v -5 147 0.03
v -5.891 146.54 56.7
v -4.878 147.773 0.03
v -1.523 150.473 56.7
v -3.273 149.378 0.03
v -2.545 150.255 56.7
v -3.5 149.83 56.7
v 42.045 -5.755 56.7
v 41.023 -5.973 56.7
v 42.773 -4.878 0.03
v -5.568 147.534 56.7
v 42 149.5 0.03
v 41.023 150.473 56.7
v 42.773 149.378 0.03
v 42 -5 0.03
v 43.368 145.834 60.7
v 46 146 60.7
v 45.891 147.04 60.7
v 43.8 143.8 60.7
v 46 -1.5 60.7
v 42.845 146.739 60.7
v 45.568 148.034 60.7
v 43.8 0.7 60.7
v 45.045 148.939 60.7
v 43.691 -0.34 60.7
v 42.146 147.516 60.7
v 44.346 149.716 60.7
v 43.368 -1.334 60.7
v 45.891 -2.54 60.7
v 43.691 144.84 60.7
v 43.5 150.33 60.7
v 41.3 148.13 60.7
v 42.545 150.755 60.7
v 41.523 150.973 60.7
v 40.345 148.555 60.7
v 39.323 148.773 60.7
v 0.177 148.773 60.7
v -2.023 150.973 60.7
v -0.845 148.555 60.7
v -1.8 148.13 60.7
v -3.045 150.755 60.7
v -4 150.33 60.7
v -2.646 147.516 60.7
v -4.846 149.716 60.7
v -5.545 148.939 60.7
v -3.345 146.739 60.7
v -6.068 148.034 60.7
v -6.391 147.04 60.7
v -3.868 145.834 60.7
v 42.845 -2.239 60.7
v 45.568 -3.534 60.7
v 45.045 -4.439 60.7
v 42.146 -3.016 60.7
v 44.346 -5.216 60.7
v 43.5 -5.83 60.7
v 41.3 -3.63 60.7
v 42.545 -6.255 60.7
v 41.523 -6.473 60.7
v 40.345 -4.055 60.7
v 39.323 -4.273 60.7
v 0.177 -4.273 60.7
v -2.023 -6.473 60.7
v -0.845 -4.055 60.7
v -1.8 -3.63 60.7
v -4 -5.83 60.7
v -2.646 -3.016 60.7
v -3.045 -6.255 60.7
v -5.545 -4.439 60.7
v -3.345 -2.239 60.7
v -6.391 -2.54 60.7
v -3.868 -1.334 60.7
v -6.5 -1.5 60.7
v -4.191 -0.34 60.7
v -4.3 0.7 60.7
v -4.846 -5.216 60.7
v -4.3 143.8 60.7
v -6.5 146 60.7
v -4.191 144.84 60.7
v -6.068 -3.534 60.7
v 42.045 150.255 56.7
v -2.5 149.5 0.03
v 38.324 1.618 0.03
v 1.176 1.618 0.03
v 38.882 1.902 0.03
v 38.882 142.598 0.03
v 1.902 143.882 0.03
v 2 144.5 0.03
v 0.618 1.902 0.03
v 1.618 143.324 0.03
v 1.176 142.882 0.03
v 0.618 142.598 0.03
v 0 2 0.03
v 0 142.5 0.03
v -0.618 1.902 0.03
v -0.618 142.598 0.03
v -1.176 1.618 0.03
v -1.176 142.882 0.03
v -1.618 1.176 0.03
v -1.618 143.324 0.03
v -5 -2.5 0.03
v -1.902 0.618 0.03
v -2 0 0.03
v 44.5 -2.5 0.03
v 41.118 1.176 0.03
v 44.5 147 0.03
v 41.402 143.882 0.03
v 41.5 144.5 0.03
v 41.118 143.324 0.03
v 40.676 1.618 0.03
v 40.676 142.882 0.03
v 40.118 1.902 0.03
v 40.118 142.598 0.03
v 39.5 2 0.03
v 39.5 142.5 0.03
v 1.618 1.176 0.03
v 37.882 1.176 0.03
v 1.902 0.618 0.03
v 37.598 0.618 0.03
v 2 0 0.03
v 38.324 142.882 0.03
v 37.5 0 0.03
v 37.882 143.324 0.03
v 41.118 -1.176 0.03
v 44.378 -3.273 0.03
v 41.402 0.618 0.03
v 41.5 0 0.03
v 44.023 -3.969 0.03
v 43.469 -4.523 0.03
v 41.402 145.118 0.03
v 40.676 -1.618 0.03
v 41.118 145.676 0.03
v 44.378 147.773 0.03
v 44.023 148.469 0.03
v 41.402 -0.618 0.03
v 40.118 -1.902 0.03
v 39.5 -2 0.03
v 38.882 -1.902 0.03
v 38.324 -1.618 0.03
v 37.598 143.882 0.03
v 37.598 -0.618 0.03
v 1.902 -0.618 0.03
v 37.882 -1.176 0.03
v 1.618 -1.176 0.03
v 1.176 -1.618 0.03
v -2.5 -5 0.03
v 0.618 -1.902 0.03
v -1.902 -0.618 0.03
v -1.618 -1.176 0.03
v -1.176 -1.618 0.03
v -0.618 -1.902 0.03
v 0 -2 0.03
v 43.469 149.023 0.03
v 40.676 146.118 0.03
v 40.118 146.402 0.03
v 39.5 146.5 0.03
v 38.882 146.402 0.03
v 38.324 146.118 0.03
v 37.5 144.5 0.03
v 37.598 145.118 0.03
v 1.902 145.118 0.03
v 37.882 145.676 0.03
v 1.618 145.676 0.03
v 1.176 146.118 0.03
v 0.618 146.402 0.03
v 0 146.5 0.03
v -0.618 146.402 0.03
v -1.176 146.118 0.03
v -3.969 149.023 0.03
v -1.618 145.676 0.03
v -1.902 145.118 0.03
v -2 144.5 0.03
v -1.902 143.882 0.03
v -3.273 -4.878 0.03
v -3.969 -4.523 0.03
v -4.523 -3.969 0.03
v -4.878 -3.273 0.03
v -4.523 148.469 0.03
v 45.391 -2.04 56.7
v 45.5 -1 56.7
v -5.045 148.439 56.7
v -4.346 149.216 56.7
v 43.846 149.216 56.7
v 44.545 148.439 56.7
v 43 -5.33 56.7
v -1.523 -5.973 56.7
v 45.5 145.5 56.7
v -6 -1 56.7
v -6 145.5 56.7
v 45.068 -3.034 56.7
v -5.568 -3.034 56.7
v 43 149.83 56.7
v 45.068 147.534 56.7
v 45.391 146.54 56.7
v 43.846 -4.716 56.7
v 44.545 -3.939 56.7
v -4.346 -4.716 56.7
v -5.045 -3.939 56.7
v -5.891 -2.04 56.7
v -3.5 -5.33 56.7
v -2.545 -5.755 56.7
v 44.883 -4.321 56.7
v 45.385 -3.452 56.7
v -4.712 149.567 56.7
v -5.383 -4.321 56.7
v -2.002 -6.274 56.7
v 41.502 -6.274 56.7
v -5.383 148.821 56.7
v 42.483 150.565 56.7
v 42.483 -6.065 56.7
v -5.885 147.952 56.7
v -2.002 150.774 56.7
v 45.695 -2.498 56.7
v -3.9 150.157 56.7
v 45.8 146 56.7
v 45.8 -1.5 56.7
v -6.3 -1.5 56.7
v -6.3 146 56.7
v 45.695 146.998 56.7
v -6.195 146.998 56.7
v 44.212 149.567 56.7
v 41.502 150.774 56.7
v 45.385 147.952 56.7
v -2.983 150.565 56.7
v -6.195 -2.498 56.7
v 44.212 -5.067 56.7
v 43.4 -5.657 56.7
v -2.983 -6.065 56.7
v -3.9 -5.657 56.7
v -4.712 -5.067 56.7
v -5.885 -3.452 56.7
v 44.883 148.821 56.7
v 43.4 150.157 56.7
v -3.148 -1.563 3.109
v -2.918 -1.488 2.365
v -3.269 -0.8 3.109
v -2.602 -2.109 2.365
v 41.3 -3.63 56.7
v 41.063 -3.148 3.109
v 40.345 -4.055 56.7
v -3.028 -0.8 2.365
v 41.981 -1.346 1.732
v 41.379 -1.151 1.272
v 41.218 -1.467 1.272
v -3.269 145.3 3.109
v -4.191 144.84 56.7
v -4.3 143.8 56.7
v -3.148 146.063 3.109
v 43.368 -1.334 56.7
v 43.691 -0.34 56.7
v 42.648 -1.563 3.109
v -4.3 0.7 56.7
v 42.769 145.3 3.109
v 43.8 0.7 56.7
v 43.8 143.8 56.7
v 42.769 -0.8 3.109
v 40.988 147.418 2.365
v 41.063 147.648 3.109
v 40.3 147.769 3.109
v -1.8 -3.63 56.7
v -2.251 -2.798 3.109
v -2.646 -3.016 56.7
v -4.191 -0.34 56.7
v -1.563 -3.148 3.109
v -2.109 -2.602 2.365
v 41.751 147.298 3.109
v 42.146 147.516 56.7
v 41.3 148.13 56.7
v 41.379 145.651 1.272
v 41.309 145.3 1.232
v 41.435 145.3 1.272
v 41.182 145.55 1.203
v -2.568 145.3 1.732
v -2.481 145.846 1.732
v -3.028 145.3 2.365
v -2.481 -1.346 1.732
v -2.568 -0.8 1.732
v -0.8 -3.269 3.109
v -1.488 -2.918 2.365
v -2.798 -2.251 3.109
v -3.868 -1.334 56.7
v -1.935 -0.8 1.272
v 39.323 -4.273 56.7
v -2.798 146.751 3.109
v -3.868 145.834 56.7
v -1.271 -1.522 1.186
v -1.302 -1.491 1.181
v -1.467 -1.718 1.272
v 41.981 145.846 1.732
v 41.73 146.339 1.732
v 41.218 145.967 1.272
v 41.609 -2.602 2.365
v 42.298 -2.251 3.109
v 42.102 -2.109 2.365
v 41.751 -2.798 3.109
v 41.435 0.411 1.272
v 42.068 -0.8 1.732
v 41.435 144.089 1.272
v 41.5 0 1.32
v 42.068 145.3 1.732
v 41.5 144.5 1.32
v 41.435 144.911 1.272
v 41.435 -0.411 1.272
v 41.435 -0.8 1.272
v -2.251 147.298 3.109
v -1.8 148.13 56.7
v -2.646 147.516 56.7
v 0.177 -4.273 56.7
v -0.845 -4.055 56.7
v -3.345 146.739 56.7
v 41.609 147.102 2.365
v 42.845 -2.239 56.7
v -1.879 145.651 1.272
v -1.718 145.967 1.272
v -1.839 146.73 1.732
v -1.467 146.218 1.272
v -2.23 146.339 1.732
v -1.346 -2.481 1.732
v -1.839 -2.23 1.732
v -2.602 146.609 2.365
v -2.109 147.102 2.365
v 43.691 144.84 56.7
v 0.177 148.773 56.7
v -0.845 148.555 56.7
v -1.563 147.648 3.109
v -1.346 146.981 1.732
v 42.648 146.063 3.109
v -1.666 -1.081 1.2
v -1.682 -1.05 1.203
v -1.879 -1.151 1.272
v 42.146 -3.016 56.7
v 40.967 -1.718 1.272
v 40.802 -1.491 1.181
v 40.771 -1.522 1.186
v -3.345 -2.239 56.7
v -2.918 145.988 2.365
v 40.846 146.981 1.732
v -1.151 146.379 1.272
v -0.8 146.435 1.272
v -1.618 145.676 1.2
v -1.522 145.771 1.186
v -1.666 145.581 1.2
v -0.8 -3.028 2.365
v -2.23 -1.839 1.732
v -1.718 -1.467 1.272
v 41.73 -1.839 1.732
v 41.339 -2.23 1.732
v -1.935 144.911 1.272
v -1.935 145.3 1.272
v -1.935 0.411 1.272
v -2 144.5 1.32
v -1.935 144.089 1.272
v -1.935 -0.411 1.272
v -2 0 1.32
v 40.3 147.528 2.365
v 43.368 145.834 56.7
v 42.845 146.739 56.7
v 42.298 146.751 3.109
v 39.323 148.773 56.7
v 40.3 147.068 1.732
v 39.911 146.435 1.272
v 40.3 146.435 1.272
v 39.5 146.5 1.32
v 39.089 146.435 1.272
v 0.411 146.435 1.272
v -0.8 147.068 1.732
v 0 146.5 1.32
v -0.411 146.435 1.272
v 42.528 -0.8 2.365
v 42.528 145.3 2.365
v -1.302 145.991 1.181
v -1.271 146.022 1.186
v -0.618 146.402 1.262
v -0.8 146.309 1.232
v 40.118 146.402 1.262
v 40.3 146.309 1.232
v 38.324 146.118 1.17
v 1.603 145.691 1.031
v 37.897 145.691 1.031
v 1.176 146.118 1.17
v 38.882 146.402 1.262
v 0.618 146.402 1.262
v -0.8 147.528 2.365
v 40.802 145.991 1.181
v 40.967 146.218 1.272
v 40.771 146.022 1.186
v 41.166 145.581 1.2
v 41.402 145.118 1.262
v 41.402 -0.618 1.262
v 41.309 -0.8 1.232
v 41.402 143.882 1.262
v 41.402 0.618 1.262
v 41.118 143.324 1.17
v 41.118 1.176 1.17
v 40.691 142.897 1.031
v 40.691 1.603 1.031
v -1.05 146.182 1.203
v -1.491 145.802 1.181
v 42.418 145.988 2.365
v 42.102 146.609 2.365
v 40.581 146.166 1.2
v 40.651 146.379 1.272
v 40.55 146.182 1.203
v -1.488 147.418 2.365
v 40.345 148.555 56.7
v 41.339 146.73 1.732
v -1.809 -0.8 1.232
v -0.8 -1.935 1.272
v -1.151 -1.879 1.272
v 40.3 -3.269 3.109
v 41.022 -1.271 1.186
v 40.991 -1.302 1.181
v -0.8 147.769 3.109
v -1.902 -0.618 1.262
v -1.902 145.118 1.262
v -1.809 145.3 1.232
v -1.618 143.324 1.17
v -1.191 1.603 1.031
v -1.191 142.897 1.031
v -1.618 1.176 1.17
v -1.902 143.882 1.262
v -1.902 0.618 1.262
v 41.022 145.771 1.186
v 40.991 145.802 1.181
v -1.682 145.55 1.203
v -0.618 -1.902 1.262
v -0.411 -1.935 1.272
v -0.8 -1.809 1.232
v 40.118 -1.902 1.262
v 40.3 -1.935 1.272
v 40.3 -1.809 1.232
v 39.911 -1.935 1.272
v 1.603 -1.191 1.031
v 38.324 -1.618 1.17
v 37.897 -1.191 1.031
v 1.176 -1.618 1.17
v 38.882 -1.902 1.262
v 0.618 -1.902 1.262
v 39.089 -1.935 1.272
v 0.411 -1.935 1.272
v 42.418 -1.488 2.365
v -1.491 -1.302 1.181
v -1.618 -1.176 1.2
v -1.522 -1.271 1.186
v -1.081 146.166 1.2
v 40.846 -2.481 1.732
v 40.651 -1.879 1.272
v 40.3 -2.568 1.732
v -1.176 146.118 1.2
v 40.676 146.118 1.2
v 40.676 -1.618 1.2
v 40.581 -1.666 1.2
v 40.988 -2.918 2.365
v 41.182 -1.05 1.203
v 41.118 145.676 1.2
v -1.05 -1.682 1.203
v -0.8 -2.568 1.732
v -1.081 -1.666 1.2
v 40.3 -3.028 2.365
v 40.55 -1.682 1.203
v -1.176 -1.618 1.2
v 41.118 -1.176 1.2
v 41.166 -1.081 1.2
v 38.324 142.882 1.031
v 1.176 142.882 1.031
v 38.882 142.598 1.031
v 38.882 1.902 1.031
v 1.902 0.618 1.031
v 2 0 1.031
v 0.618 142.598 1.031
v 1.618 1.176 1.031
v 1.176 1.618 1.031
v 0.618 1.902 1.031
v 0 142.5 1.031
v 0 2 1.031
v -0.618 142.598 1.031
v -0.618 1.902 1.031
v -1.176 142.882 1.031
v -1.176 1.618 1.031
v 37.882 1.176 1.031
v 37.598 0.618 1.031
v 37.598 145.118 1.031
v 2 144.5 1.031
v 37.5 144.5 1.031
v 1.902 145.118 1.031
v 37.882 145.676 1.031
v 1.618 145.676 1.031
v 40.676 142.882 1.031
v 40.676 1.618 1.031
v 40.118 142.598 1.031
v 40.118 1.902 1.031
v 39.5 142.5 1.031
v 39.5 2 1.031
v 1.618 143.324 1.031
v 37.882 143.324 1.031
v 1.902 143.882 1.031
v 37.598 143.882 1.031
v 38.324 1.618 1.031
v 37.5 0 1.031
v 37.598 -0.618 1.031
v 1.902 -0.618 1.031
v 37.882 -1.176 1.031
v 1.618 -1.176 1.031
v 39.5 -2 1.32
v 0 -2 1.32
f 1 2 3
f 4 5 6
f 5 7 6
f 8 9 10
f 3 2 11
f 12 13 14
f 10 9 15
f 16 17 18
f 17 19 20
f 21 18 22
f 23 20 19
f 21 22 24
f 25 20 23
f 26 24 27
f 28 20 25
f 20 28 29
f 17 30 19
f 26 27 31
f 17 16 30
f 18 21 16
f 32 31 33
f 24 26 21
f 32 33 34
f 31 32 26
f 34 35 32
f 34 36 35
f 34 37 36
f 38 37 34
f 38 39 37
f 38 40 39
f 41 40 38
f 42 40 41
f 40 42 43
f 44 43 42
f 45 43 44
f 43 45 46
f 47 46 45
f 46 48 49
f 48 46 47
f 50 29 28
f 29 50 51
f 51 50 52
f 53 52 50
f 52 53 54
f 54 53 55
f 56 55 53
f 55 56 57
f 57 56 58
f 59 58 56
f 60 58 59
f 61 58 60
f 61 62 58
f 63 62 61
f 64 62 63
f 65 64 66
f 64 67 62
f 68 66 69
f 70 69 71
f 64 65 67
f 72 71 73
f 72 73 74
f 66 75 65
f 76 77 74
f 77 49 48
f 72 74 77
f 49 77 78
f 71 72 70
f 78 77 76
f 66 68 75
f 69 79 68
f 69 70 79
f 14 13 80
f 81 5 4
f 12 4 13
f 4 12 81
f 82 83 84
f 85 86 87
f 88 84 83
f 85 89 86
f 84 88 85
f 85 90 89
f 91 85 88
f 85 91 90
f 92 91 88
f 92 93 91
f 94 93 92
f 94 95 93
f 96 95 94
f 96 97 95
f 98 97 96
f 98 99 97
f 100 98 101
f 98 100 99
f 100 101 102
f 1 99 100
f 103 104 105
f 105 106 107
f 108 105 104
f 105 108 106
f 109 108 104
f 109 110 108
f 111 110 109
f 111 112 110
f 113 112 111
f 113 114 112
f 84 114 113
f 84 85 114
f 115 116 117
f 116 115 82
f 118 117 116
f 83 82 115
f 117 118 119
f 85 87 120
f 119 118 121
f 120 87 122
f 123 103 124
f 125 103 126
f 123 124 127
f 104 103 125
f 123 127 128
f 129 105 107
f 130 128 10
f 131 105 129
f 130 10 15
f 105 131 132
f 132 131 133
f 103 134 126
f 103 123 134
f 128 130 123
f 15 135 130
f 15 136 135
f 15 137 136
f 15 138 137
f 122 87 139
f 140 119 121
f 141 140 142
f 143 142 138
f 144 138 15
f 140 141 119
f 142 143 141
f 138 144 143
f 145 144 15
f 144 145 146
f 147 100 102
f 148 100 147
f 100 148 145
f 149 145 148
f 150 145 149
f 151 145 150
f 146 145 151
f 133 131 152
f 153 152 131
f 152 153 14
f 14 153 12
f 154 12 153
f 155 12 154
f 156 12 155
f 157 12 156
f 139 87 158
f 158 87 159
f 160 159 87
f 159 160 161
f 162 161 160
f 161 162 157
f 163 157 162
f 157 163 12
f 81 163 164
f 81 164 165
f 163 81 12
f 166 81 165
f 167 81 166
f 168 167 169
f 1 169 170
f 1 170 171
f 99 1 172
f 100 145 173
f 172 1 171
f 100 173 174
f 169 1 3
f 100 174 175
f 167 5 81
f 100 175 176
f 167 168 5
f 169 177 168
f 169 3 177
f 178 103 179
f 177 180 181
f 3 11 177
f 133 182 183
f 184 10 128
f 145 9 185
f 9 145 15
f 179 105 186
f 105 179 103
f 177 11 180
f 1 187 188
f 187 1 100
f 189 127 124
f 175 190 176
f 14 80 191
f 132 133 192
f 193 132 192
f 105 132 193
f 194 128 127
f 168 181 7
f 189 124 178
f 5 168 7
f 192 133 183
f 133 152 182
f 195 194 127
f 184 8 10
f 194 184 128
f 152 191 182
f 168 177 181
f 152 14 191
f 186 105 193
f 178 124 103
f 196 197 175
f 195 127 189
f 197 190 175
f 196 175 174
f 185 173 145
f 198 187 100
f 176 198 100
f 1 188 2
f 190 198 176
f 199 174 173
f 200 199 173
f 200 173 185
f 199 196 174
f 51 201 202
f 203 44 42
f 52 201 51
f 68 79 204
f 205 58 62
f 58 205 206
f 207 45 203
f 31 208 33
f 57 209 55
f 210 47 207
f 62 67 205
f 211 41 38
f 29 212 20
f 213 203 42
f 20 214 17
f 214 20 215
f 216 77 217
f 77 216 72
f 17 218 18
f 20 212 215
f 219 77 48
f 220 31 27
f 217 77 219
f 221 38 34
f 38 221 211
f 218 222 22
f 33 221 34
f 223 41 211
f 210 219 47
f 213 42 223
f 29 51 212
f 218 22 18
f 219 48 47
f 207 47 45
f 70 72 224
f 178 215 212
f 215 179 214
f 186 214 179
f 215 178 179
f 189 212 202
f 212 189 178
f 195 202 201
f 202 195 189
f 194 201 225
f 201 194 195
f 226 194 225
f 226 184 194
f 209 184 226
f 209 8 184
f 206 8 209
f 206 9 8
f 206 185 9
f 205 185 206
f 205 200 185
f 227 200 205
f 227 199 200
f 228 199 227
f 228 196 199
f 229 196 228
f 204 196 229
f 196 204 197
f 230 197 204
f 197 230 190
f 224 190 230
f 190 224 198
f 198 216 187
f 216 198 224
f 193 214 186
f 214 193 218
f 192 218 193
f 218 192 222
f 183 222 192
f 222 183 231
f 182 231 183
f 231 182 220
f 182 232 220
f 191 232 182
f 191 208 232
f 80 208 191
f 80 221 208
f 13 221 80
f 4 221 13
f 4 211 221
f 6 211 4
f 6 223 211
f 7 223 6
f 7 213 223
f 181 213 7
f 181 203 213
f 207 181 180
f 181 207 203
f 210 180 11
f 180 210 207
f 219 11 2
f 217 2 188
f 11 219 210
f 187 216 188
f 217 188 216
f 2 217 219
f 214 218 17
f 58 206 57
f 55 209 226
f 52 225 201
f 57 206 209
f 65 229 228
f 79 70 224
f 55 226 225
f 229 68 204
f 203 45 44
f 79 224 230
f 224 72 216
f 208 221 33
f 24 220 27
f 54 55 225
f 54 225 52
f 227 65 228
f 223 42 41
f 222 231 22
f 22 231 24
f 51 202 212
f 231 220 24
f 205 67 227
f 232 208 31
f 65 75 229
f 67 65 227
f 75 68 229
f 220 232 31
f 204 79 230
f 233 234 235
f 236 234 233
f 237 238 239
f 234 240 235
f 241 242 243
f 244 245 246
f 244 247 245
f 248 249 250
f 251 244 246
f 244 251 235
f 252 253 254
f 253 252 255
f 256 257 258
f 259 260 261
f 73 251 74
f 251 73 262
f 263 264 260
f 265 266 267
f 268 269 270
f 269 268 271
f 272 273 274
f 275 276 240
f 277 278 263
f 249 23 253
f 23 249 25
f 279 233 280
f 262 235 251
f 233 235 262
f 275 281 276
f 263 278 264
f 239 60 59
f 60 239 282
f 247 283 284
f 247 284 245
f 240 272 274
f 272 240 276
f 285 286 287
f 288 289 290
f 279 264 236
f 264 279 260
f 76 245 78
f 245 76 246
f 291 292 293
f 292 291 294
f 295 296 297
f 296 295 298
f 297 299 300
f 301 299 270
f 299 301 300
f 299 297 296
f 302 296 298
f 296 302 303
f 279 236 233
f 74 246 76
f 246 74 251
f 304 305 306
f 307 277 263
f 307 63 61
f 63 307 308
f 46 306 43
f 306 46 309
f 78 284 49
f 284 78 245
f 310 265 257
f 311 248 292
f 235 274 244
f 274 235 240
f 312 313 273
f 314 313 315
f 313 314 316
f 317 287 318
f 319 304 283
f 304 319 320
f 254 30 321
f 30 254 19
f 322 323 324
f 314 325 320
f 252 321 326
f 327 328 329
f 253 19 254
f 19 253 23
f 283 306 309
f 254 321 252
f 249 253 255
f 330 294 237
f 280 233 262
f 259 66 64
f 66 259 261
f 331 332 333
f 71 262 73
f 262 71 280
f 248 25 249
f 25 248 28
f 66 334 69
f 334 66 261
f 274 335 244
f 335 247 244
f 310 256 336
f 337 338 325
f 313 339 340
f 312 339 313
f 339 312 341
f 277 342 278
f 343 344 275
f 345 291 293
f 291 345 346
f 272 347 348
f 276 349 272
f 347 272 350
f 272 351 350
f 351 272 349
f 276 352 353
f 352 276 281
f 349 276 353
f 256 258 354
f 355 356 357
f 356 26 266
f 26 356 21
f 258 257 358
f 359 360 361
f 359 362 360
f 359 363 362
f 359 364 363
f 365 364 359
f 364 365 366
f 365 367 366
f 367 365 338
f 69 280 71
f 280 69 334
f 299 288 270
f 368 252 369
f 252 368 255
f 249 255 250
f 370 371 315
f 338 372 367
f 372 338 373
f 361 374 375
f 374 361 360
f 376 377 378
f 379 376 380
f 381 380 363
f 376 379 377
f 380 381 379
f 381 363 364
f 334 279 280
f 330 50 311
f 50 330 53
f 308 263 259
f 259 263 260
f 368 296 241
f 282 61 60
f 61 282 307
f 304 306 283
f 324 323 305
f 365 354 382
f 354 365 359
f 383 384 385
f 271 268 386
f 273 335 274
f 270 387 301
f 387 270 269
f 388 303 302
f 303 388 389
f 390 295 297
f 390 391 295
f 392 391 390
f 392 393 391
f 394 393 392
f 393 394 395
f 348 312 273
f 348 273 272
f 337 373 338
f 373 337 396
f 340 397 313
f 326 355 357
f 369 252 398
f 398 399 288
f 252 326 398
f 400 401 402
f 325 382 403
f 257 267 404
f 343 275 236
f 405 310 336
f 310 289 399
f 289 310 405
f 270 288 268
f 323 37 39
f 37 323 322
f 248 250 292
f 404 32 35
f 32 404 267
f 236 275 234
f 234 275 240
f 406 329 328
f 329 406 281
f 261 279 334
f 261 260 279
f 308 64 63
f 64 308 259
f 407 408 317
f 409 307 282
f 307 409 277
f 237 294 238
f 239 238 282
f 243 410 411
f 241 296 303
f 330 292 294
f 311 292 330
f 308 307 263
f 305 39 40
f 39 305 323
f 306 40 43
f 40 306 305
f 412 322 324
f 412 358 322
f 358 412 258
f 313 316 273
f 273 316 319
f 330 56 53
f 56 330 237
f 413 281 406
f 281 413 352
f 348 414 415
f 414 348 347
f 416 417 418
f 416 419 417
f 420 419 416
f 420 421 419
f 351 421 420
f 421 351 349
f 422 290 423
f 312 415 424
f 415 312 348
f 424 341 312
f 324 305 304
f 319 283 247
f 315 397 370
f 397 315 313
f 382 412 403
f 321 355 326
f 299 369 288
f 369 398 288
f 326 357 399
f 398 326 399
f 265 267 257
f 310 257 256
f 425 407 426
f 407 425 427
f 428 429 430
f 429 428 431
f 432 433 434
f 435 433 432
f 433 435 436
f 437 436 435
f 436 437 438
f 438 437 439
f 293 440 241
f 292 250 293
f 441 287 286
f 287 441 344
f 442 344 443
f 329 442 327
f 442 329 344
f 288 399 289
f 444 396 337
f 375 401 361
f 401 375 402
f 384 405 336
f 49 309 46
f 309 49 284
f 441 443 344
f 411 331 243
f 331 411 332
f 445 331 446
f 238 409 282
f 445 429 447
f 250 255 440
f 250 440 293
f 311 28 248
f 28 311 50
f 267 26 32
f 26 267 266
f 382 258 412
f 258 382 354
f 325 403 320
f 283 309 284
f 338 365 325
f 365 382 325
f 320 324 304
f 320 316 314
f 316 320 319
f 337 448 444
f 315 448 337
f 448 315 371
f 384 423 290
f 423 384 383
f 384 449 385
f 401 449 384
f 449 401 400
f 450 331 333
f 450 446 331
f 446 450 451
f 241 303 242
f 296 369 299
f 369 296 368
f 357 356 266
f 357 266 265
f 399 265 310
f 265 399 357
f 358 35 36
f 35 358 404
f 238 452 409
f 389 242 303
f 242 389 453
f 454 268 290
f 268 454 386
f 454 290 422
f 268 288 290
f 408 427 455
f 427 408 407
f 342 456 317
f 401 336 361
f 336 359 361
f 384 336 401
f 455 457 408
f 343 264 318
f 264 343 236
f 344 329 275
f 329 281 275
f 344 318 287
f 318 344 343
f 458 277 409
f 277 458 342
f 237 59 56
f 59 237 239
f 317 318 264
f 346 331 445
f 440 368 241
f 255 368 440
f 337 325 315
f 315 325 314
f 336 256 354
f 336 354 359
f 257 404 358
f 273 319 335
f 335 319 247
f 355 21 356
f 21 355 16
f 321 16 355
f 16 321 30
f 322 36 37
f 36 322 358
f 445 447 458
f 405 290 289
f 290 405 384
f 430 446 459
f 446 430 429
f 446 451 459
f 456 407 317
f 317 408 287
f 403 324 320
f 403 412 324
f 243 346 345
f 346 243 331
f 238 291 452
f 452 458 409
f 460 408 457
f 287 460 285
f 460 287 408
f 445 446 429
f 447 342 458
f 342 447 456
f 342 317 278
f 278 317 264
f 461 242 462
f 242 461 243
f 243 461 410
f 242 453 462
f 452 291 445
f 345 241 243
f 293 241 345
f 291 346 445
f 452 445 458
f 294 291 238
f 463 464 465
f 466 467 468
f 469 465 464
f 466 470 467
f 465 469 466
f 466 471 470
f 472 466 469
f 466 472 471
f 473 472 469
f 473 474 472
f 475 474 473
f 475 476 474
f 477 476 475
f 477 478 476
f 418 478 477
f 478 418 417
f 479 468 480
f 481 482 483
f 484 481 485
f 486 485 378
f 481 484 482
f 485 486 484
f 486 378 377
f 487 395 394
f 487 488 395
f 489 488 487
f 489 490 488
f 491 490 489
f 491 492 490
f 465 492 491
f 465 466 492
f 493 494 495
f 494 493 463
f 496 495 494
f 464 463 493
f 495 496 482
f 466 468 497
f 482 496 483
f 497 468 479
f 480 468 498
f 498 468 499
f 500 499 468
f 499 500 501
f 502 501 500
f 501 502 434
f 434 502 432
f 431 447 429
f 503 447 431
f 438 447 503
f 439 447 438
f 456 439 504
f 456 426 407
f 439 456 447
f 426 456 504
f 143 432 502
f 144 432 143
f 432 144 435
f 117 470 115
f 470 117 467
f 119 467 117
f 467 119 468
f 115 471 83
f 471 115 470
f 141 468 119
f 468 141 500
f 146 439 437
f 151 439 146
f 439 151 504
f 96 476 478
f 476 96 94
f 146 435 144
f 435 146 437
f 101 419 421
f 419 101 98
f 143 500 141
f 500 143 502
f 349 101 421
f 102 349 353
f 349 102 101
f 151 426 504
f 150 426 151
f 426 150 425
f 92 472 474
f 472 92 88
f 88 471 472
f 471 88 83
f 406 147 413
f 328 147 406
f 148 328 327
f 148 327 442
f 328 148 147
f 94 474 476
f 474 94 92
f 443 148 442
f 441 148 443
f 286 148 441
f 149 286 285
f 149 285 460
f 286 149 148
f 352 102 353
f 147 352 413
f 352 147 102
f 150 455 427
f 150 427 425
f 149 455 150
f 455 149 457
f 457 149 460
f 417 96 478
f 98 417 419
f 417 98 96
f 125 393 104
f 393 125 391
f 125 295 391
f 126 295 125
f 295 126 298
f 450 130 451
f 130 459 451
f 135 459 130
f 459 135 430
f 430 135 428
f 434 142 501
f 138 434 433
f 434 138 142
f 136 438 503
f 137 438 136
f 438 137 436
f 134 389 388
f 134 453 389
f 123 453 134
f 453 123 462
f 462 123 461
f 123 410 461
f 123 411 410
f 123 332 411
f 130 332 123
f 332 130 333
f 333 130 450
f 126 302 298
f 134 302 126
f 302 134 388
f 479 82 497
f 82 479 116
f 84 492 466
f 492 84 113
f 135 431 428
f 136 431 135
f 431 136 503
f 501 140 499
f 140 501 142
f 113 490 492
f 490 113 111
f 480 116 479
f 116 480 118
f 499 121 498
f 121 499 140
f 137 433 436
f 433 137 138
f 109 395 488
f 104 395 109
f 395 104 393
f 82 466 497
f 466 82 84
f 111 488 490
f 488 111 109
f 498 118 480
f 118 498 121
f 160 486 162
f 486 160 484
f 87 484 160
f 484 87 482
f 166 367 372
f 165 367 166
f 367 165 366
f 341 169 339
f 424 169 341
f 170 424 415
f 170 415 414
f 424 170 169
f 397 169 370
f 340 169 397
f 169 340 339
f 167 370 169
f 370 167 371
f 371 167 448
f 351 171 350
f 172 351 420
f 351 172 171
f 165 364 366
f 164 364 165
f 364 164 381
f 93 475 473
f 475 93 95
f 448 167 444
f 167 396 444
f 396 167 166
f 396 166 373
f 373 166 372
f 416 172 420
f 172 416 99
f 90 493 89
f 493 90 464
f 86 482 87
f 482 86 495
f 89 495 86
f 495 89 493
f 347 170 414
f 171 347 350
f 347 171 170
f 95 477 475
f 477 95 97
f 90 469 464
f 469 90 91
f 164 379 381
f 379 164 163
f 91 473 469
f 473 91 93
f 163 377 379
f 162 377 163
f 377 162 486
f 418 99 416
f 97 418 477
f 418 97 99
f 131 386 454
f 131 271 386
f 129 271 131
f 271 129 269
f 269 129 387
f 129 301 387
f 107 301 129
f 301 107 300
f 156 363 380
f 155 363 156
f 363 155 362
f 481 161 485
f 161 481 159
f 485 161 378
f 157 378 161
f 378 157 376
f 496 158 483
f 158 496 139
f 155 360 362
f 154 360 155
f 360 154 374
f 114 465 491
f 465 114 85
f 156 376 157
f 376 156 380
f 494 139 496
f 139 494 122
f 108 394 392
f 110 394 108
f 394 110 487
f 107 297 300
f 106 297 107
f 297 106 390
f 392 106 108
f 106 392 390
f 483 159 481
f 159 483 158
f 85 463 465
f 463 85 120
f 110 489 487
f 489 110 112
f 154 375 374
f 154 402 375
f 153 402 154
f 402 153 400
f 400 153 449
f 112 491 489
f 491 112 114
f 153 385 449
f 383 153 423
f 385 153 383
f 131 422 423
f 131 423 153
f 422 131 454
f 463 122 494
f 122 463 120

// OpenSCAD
// created by pretenda
// http://www.thingiverse.com/pretenda/designs

// If you are reading this, sorry for my spaghetti code.

// Options!
//cube([39.5,92,50]);
/* [T-Boxx Insert] */
// What do you want to render out?
what = "boxx"; // [boxx:Boxx Insert,pegs:Pegs,both:Both Boxx Insert and Pegs]
// How many units wide?
modulesH = 1; // [1:8]
// How many units deep?
modulesV = 3; // [1:6]

/* [Misc Parameters] */
// Wall Thickness. Too thin and it is a bit flimsy, 1.7 seems about right for me.
wallThickness = 1.7;
// Peg Diameter. This width for me is quite snug, might need to dial it down depending on your printer.
pegDiameter = 7.4;

/* [Hidden] */
pegDistance = 39.5; //92 for two -- so 13 difference
baseCornerDiameter = 5;
topCornerDiameter = 10;
topWidth = 52.5;
topLowerWidth = 51.5;
topInnerDiameter = 48.5;
bottomWidth = 49.5;
height = 60.7;



pegSlackH = (modulesH - 1) * 13;
pegSlackV = (modulesV - 1) * 13;

blPosX = 0;
blPosY = 0;

brPosX = modulesH * pegDistance + pegSlackH;
brPosY = 0;

tlPosX = 0;
tlPosY = modulesV * pegDistance + pegSlackV;

trPosX = modulesH * pegDistance + pegSlackH;
trPosY = modulesV * pegDistance + pegSlackV;

// Pegs?!
/*translate([0,0,-2]) {
cylinder(2, pegDiameter / 2, pegDiameter / 2);
translate([brPosX, 0, 0]) cylinder(2, pegDiameter / 2, pegDiameter / 2);
translate([0, tlPosY, 0]) cylinder(2, pegDiameter / 2, pegDiameter / 2);
translate([trPosX, trPosY, 0]) cylinder(2, pegDiameter / 2, pegDiameter / 2);
}*/

module boxx()
{

difference()
{

union()
{
hull()
{

translate([-(bottomWidth - pegDistance) / 2 + baseCornerDiameter / 2, -(bottomWidth - pegDistance) / 2 + baseCornerDiameter / 2, 0.03]) #cylinder(2, baseCornerDiameter/2,baseCornerDiameter/2, $fn = 20);


translate([brPosX, brPosY, 0]) translate([(bottomWidth - pegDistance) / 2 - baseCornerDiameter / 2, -(bottomWidth - pegDistance) / 2 + baseCornerDiameter / 2, 0.03]) #cylinder(2, baseCornerDiameter/2,baseCornerDiameter/2, $fn = 20);

translate([tlPosX, tlPosY, 0]) translate([-(bottomWidth - pegDistance) / 2 + baseCornerDiameter / 2, (bottomWidth - pegDistance) / 2 - baseCornerDiameter / 2, 0.03]) #cylinder(2, baseCornerDiameter/2,baseCornerDiameter/2, $fn = 20);

translate([trPosX, trPosY, 0]) translate([(bottomWidth - pegDistance) / 2 - baseCornerDiameter / 2, (bottomWidth - pegDistance) / 2 - baseCornerDiameter / 2, 0.03]) #cylinder(2, baseCornerDiameter/2,baseCornerDiameter/2, $fn = 20);

// Bottom
translate([blPosX, blPosY, height]) translate([-(topLowerWidth - pegDistance) / 2 + topCornerDiameter / 2, -(topLowerWidth - pegDistance) / 2 + topCornerDiameter / 2, -4]) cylinder(4, topCornerDiameter / 2, topCornerDiameter / 2, $fn = 30);

translate([brPosX, brPosY, height]) translate([(topLowerWidth - pegDistance) / 2 - topCornerDiameter / 2, -(topLowerWidth - pegDistance) / 2 + topCornerDiameter / 2, -4]) cylinder(4, topCornerDiameter / 2, topCornerDiameter / 2, $fn = 30);

translate([tlPosX, tlPosY, height]) translate([-(topLowerWidth - pegDistance) / 2 + topCornerDiameter / 2, (topLowerWidth - pegDistance) / 2 - topCornerDiameter / 2, -4]) cylinder(4, topCornerDiameter / 2, topCornerDiameter / 2, $fn = 30);

translate([trPosX, trPosY, height]) translate([(topLowerWidth - pegDistance) / 2 - topCornerDiameter / 2, (topLowerWidth - pegDistance) / 2 - topCornerDiameter / 2, -4]) cylinder(4, topCornerDiameter / 2, topCornerDiameter / 2, $fn = 30);
}


hull()
{


translate([blPosX, blPosY, height]) translate([-(topWidth - pegDistance) / 2 + topCornerDiameter / 2, -(topWidth - pegDistance) / 2 + topCornerDiameter / 2, -4]) cylinder(4, topCornerDiameter / 2 -0.2, topCornerDiameter / 2, $fn = 30);

translate([brPosX, brPosY, height]) translate([(topWidth - pegDistance) / 2 - topCornerDiameter / 2, -(topWidth - pegDistance) / 2 + topCornerDiameter / 2, -4]) cylinder(4, topCornerDiameter / 2 -0.2, topCornerDiameter / 2, $fn = 30);

translate([tlPosX, tlPosY, height]) translate([-(topWidth - pegDistance) / 2 + topCornerDiameter / 2, (topWidth - pegDistance) / 2 - topCornerDiameter / 2, -4]) cylinder(4, topCornerDiameter / 2 -0.2, topCornerDiameter / 2, $fn = 30);

translate([trPosX, trPosY, height]) translate([(topWidth - pegDistance) / 2 - topCornerDiameter / 2, (topWidth - pegDistance) / 2 - topCornerDiameter / 2, -4]) cylinder(4, topCornerDiameter / 2 -0.2, topCornerDiameter / 2, $fn = 30);

}
}




 // inside carved out
hull()
{
translate([blPosX +wallThickness, blPosY + wallThickness, 1]) translate([-(bottomWidth - pegDistance) / 2 + baseCornerDiameter / 2, -(bottomWidth - pegDistance) / 2 + baseCornerDiameter / 2, baseCornerDiameter / 2]) sphere(baseCornerDiameter/2, $fn = 20);

translate([brPosX - wallThickness, brPosY + wallThickness, 1]) translate([(bottomWidth - pegDistance) / 2 - baseCornerDiameter / 2, -(bottomWidth - pegDistance) / 2 + baseCornerDiameter / 2, baseCornerDiameter / 2]) sphere(baseCornerDiameter/2, $fn = 20);

translate([tlPosX + wallThickness, tlPosY - wallThickness, 1]) translate([-(bottomWidth - pegDistance) / 2 + baseCornerDiameter / 2, (bottomWidth - pegDistance) / 2 - baseCornerDiameter / 2, baseCornerDiameter / 2]) sphere(baseCornerDiameter/2, $fn = 20);

translate([trPosX - wallThickness, trPosY - wallThickness, 1]) translate([(bottomWidth - pegDistance) / 2 - baseCornerDiameter / 2, (bottomWidth - pegDistance) / 2 - baseCornerDiameter / 2, baseCornerDiameter / 2]) sphere(baseCornerDiameter/2, $fn = 20);

// Bottom
translate([blPosX + wallThickness, blPosY + wallThickness, height]) translate([-(topLowerWidth - pegDistance) / 2 + topCornerDiameter / 2, -(topLowerWidth - pegDistance) / 2 + topCornerDiameter / 2, -4]) cylinder(5, topCornerDiameter / 2, topCornerDiameter / 2, $fn = 30);

translate([brPosX - wallThickness, brPosY + wallThickness, height]) translate([(topLowerWidth - pegDistance) / 2 - topCornerDiameter / 2, -(topLowerWidth - pegDistance) / 2 + topCornerDiameter / 2, -4]) cylinder(5, topCornerDiameter / 2, topCornerDiameter / 2, $fn = 30);

translate([tlPosX + wallThickness, tlPosY - wallThickness, height]) translate([-(topLowerWidth - pegDistance) / 2 + topCornerDiameter / 2, (topLowerWidth - pegDistance) / 2 - topCornerDiameter / 2, -4]) cylinder(5, topCornerDiameter / 2, topCornerDiameter / 2, $fn = 30);

translate([trPosX - wallThickness, trPosY- wallThickness, height]) translate([(topLowerWidth - pegDistance) / 2 - topCornerDiameter / 2, (topLowerWidth - pegDistance) / 2 - topCornerDiameter / 2, -4]) cylinder(5, topCornerDiameter / 2, topCornerDiameter / 2, $fn = 30);
}


// Holes for pegs to slot into

cylinder(20, 2, 2, $fn = 20);
translate([brPosX, 0, 0]) cylinder(20, 2, 2, $fn = 20);
translate([0, tlPosY, 0]) cylinder(20, 2, 2, $fn = 20);
translate([trPosX, trPosY, 0]) cylinder(20, 2, 2, $fn = 20);

}
}




module peg() {
union()
{
cylinder(2, pegDiameter/2, pegDiameter/2, $fn = 20);
translate([0,0,1]) cylinder(2, 1.8, 1.8, $fn = 20);
}
}


if (what == "boxx" || what == "both")
{
// Boxx!

boxx();

}

if (what == "pegs" || what == "both")
{
// Pegs!
translate([-20,0,0]) {
translate([0, 0, 0]) peg();
translate([0, pegDiameter + 2, 0]) peg();
translate([0, (pegDiameter+2)*2, 0]) peg();
translate([0, (pegDiameter+2)*3, 0]) peg();
}


}
